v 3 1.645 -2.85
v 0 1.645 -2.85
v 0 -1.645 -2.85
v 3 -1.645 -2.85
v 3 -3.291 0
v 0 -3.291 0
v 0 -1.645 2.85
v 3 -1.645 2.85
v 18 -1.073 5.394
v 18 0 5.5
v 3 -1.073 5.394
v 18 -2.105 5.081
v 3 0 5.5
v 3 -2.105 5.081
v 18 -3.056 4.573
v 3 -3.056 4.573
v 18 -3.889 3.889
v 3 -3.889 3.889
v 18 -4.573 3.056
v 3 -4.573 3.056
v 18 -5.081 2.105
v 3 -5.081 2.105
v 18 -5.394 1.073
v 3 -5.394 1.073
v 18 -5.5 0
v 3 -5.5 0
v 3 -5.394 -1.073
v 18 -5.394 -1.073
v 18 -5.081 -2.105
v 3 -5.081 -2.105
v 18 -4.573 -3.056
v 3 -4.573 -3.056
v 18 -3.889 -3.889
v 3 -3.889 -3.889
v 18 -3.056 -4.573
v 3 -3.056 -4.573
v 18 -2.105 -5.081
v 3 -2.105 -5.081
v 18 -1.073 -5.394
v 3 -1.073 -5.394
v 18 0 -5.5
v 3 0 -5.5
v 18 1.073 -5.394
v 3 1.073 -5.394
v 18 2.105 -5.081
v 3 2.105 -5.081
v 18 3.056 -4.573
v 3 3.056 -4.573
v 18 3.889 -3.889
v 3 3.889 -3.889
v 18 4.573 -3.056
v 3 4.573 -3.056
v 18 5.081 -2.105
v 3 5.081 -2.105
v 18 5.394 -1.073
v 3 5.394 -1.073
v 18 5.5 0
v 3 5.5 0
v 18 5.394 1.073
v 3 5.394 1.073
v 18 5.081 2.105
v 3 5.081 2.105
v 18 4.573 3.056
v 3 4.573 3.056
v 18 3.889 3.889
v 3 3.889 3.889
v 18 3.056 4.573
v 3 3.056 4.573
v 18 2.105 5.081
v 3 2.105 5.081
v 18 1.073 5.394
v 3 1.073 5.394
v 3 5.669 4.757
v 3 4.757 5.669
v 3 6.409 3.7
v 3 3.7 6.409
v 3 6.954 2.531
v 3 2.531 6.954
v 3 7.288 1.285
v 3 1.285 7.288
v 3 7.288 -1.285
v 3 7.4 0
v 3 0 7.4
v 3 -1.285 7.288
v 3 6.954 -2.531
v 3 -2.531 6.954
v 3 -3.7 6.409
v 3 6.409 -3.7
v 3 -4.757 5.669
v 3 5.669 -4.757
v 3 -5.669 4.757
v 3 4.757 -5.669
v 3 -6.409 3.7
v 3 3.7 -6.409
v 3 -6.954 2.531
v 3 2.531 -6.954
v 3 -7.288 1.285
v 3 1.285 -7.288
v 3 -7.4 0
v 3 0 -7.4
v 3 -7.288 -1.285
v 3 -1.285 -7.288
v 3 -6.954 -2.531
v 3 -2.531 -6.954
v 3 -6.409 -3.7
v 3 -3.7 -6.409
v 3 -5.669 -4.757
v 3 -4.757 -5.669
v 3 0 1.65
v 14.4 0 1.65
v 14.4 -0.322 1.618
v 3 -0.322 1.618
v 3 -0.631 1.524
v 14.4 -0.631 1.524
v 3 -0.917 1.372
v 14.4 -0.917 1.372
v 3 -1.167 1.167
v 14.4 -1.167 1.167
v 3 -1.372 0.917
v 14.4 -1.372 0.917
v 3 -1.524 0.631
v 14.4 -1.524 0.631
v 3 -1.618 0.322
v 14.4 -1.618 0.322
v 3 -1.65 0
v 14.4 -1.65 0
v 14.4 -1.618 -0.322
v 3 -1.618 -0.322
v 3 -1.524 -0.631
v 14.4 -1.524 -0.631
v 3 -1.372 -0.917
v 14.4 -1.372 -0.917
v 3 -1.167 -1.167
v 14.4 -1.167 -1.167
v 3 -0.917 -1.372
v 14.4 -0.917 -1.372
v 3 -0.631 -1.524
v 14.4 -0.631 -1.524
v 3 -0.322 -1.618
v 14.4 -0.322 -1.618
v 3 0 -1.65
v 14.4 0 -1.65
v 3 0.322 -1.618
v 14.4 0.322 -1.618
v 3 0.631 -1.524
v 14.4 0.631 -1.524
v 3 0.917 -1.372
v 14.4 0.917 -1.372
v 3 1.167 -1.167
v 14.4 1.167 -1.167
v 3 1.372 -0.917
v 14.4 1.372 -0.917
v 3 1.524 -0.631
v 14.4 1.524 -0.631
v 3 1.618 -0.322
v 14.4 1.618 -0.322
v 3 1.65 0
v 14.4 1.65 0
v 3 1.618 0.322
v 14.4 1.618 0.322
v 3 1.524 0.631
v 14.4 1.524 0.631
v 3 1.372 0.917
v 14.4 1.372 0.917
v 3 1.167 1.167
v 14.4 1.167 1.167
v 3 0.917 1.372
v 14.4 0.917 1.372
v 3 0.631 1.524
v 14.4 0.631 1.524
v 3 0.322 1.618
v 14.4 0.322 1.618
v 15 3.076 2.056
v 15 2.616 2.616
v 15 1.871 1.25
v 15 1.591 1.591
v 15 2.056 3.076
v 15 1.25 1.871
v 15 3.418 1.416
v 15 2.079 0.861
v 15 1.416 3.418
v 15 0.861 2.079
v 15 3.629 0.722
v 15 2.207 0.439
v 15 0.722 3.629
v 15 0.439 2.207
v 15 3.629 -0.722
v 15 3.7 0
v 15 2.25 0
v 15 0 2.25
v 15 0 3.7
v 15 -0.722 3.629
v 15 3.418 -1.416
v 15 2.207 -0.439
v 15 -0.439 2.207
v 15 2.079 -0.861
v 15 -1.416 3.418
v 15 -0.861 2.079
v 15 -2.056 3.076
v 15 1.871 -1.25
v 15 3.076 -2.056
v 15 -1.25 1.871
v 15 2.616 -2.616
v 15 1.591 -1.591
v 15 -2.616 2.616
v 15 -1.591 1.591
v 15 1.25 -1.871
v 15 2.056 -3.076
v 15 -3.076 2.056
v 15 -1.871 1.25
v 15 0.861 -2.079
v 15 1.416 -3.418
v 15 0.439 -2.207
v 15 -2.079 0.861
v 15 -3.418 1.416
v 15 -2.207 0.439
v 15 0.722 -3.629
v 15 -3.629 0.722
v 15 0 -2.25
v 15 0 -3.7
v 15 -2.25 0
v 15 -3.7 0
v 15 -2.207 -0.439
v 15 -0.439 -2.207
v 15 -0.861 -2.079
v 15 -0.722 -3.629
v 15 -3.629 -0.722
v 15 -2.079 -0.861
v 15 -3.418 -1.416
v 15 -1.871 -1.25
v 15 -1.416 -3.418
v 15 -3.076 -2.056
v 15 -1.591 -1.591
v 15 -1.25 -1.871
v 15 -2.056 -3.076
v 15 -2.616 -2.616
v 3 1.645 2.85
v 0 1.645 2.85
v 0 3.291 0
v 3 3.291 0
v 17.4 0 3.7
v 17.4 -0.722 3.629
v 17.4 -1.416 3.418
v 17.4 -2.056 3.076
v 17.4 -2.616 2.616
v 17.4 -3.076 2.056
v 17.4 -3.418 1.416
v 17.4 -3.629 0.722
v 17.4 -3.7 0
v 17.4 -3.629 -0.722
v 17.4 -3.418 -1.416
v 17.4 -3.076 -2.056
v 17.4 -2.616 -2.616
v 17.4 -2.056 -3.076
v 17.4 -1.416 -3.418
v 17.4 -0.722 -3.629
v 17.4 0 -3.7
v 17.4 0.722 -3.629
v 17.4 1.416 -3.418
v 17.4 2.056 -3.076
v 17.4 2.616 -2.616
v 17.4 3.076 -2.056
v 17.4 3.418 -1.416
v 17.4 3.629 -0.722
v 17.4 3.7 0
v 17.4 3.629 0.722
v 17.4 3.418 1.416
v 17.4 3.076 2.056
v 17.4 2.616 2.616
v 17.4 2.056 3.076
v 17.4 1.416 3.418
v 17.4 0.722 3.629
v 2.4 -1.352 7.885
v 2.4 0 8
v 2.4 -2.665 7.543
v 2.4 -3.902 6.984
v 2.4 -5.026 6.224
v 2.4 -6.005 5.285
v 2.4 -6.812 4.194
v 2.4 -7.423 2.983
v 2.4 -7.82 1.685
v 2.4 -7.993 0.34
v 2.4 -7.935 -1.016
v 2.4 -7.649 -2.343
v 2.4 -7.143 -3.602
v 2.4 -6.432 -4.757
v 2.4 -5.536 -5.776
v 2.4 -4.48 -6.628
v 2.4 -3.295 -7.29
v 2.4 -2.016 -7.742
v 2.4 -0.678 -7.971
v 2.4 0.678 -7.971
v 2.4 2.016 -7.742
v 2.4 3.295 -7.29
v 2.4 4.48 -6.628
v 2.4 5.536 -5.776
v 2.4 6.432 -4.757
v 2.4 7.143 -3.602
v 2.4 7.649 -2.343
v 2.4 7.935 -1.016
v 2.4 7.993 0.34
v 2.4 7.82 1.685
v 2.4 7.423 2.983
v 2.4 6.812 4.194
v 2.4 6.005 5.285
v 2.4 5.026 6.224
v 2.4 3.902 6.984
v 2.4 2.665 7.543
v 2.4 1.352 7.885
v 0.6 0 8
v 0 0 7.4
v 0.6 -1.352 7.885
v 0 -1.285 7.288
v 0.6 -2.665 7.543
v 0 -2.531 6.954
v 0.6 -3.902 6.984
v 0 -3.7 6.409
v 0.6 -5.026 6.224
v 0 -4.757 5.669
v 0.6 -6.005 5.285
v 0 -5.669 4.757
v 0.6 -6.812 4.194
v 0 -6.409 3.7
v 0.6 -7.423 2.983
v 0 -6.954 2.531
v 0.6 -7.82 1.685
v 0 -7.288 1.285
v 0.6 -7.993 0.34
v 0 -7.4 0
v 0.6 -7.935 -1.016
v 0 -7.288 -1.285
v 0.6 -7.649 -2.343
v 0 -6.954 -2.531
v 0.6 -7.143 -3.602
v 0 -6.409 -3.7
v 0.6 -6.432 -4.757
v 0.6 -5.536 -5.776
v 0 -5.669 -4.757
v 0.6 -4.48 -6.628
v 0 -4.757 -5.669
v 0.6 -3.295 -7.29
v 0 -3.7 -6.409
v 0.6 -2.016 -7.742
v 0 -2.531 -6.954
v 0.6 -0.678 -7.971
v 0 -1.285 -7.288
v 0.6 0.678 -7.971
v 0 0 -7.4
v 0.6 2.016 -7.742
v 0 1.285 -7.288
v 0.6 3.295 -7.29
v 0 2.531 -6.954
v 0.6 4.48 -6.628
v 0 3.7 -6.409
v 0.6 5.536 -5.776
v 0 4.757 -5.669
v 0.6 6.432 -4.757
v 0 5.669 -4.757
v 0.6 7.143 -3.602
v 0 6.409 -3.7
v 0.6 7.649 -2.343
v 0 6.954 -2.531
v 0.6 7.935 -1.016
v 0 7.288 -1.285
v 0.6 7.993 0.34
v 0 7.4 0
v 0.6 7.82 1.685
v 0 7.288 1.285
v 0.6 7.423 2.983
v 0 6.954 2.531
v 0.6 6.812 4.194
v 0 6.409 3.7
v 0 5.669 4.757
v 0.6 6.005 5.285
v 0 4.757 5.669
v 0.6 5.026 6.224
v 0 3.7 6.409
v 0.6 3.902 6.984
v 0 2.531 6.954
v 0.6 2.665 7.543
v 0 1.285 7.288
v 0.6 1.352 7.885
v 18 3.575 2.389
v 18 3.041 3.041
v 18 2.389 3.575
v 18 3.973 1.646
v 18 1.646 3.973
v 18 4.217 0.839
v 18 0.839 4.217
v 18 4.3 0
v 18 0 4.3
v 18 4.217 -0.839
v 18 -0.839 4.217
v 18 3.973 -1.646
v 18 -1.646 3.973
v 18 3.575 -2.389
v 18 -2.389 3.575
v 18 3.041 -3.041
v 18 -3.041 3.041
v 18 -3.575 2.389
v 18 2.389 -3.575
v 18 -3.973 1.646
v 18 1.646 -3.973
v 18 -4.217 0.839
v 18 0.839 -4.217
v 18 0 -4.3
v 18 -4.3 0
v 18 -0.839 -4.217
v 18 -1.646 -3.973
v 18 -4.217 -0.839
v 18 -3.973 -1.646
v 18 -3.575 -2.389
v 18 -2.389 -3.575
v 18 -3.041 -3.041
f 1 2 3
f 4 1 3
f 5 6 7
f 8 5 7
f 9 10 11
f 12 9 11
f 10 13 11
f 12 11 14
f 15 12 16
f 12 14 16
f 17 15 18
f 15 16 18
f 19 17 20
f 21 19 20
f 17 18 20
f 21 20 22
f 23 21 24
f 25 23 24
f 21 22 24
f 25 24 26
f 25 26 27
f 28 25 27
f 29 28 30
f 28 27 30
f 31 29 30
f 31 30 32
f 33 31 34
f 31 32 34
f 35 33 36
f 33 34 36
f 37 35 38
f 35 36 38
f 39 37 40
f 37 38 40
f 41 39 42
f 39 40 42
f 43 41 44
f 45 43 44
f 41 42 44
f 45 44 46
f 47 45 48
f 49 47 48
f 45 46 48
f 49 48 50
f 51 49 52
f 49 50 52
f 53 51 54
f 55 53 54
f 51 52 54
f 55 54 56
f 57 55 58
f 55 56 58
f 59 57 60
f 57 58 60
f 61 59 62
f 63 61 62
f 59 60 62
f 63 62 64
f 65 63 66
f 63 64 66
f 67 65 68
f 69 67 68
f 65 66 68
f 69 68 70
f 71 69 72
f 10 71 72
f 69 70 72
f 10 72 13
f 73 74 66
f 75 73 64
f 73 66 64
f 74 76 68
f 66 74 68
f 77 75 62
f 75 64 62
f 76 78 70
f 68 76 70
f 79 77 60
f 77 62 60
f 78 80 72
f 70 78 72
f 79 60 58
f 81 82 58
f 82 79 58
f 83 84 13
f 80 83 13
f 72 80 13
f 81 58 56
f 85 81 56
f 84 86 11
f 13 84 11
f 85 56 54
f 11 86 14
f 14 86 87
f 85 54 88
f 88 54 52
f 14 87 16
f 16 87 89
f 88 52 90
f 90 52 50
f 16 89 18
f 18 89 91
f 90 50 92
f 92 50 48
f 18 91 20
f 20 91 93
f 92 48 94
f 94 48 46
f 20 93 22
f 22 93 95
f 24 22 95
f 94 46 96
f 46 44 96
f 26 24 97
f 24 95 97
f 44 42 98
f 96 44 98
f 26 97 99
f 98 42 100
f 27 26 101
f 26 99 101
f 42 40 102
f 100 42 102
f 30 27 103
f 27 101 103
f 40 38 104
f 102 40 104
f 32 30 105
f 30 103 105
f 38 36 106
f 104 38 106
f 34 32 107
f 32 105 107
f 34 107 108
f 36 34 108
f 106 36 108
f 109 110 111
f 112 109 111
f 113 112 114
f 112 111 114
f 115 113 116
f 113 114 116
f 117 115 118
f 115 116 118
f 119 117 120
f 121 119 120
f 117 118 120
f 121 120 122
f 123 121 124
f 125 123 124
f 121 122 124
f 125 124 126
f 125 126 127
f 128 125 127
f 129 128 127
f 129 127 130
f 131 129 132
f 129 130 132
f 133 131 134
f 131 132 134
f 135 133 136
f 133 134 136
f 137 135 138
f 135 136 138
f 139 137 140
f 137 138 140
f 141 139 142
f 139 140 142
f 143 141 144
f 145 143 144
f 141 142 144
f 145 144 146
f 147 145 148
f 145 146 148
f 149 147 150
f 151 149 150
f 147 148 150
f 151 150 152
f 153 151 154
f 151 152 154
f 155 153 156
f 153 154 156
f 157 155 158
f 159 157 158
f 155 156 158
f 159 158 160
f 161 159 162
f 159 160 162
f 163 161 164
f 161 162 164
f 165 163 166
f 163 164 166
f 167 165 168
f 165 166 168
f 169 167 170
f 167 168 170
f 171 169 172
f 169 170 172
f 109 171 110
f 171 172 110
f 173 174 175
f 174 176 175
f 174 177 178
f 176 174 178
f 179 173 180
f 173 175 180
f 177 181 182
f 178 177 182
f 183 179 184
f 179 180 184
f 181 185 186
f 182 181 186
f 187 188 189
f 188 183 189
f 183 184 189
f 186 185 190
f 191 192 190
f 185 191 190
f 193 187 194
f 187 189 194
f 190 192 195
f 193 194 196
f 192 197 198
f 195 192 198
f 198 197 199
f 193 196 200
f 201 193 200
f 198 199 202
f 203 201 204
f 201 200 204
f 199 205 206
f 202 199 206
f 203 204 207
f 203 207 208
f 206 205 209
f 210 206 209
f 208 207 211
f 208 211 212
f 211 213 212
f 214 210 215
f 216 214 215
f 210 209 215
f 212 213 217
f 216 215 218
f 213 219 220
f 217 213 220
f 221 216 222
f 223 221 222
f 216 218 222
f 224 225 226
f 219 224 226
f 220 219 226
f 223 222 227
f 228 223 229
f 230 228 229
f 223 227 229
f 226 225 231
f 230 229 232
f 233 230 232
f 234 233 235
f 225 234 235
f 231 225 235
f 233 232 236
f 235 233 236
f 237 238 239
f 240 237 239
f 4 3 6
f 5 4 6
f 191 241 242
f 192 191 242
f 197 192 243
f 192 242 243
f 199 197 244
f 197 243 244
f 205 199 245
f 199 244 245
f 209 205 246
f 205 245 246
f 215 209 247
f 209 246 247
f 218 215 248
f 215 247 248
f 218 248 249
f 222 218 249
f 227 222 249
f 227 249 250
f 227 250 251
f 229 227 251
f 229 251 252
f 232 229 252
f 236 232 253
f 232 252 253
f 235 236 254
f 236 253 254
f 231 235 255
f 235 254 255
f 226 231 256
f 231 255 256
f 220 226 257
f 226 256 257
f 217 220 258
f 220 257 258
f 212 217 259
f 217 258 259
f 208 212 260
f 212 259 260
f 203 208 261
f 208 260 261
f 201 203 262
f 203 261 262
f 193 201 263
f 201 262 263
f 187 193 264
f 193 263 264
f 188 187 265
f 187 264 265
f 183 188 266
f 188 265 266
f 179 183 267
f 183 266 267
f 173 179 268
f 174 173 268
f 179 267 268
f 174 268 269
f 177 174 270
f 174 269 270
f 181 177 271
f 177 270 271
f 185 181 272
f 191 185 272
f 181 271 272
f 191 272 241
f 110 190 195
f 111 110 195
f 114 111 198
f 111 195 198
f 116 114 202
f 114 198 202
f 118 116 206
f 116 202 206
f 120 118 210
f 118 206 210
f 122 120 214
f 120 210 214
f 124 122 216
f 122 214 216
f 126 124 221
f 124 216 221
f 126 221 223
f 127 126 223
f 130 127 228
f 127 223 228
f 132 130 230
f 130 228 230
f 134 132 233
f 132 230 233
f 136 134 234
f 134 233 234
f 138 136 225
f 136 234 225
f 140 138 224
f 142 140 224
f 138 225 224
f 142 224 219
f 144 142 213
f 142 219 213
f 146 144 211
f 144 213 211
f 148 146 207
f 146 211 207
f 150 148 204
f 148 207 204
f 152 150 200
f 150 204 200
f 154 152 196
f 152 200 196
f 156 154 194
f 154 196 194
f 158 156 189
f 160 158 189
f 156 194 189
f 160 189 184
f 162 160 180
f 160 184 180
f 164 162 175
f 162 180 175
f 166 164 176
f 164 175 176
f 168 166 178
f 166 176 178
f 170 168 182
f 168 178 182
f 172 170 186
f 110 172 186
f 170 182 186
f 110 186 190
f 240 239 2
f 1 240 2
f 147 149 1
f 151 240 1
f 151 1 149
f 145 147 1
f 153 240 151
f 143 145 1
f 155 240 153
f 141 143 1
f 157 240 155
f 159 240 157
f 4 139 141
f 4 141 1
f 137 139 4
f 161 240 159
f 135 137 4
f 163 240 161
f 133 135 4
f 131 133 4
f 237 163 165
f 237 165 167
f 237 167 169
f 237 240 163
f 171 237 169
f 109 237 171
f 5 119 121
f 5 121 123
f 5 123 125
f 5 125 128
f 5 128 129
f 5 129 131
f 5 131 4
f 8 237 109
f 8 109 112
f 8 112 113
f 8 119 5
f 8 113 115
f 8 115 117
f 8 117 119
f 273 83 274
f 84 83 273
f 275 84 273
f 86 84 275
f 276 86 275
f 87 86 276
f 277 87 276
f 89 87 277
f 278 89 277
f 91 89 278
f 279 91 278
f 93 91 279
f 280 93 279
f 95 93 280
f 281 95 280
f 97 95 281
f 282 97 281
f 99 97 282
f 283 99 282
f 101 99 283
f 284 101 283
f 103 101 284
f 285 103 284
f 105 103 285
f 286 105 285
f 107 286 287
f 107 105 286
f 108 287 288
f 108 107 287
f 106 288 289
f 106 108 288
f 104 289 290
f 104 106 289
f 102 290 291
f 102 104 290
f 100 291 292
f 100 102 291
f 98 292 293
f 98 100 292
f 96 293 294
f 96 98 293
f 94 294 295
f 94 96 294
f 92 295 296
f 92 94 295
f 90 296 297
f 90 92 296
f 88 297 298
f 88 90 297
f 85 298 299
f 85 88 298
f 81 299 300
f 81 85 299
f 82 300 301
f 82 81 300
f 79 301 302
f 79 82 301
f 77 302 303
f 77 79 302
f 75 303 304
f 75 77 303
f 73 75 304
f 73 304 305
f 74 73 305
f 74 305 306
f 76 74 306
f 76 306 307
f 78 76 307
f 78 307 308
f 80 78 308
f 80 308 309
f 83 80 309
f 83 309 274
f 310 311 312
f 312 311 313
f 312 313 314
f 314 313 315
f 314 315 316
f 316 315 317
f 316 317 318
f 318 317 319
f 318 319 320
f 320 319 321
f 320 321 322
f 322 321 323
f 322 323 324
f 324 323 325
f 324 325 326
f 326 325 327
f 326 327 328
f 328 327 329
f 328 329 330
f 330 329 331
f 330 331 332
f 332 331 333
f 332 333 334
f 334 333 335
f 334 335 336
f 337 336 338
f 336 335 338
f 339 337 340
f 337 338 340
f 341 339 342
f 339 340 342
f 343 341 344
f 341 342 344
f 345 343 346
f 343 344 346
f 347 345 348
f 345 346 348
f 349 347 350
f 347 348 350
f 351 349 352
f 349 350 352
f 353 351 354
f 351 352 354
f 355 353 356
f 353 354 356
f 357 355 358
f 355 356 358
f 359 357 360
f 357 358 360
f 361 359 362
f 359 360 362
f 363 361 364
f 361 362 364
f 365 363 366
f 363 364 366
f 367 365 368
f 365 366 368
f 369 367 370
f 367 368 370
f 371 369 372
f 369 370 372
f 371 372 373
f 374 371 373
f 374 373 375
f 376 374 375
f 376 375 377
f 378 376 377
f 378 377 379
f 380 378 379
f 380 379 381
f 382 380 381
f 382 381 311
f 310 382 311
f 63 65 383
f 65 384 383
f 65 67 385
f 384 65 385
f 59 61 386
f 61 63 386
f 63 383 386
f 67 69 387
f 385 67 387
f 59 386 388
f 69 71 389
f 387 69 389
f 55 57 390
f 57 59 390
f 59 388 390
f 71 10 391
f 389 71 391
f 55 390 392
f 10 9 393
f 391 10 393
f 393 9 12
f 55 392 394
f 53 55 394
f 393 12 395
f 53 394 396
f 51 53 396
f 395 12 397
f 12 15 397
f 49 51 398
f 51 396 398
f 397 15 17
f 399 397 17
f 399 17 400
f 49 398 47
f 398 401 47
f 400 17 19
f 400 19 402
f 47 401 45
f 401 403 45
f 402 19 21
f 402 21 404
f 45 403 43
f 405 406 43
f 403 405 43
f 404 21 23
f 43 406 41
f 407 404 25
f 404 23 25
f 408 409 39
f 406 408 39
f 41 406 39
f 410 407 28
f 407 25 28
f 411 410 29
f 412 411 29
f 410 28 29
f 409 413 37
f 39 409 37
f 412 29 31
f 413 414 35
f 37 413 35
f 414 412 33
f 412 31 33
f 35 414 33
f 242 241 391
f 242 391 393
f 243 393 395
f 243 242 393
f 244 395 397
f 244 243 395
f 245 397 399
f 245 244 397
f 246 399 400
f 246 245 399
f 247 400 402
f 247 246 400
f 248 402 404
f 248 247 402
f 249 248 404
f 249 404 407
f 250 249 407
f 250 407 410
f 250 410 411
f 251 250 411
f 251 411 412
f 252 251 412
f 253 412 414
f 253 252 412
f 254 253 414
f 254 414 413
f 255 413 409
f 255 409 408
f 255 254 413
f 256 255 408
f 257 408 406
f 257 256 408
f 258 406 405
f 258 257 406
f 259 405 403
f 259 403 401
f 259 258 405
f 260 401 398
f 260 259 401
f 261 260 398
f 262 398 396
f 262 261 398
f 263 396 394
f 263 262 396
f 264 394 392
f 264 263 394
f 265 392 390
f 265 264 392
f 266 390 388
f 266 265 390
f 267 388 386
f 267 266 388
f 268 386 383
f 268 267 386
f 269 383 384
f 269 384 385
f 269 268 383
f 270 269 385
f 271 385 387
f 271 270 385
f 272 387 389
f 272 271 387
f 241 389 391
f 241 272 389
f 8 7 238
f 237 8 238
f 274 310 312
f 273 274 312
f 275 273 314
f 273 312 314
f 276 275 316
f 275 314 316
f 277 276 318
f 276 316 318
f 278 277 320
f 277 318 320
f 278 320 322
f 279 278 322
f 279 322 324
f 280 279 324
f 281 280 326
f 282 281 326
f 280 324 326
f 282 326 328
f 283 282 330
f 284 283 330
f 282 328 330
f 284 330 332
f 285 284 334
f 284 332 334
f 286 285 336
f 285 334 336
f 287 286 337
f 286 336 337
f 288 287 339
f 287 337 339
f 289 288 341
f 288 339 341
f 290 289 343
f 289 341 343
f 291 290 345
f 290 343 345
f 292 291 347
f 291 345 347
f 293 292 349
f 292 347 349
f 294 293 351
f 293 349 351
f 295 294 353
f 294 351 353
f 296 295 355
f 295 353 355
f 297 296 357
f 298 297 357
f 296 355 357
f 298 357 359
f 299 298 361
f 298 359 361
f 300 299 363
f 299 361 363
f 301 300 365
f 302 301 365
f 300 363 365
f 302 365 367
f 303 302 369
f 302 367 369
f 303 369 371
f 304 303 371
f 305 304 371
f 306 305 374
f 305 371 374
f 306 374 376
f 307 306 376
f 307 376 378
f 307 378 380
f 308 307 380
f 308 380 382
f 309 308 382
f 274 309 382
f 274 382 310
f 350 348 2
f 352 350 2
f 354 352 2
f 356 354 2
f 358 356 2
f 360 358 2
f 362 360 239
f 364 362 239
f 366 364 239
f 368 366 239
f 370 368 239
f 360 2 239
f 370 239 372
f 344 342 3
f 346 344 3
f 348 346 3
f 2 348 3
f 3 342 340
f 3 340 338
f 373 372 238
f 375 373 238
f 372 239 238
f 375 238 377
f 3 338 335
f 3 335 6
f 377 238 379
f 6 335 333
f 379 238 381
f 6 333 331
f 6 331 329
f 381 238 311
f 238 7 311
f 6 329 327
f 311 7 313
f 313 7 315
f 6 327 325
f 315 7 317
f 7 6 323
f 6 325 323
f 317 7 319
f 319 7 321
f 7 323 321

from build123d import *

# Parameters (mm, degrees)
F3_DEPTH = 3
F4_SIZE  = 0.6


with BuildPart() as f1:
    # F0 (on Front) → F1 (revolve)
    with BuildSketch(Plane.XZ):
        Polygon((3, 8), (0, 8), (0, 1.65), (15, 1.65), (15, 3.7), (18, 3.7), (18, 5.5), (3, 5.5), align=None)
    revolve(axis=Axis((6.870626, 0, 0), (1, 0, 0)))

    # F2 (on face) → F3 (cut)
    with BuildSketch(Plane(origin=(0, 0, 0), x_dir=(0, -1, 0), z_dir=(-1, 0, 0))):
        Polygon((-1.645448, -2.85), (1.645448, -2.85), (3.290897, 0), (1.645448, 2.85), (-1.645448, 2.85), (-3.290897, 0), align=None)
    extrude(amount=-F3_DEPTH, mode=Mode.SUBTRACT)

    # F4
    f4_edges = [f1.edges().sort_by_distance(p)[0] for p in [
        (0, 0, -8),
        (18, 0, -3.7),
        (15, 0, -1.65),
        (3, 0, -8),
    ]]
    chamfer(f4_edges, length=F4_SIZE)


solid = f1.part
